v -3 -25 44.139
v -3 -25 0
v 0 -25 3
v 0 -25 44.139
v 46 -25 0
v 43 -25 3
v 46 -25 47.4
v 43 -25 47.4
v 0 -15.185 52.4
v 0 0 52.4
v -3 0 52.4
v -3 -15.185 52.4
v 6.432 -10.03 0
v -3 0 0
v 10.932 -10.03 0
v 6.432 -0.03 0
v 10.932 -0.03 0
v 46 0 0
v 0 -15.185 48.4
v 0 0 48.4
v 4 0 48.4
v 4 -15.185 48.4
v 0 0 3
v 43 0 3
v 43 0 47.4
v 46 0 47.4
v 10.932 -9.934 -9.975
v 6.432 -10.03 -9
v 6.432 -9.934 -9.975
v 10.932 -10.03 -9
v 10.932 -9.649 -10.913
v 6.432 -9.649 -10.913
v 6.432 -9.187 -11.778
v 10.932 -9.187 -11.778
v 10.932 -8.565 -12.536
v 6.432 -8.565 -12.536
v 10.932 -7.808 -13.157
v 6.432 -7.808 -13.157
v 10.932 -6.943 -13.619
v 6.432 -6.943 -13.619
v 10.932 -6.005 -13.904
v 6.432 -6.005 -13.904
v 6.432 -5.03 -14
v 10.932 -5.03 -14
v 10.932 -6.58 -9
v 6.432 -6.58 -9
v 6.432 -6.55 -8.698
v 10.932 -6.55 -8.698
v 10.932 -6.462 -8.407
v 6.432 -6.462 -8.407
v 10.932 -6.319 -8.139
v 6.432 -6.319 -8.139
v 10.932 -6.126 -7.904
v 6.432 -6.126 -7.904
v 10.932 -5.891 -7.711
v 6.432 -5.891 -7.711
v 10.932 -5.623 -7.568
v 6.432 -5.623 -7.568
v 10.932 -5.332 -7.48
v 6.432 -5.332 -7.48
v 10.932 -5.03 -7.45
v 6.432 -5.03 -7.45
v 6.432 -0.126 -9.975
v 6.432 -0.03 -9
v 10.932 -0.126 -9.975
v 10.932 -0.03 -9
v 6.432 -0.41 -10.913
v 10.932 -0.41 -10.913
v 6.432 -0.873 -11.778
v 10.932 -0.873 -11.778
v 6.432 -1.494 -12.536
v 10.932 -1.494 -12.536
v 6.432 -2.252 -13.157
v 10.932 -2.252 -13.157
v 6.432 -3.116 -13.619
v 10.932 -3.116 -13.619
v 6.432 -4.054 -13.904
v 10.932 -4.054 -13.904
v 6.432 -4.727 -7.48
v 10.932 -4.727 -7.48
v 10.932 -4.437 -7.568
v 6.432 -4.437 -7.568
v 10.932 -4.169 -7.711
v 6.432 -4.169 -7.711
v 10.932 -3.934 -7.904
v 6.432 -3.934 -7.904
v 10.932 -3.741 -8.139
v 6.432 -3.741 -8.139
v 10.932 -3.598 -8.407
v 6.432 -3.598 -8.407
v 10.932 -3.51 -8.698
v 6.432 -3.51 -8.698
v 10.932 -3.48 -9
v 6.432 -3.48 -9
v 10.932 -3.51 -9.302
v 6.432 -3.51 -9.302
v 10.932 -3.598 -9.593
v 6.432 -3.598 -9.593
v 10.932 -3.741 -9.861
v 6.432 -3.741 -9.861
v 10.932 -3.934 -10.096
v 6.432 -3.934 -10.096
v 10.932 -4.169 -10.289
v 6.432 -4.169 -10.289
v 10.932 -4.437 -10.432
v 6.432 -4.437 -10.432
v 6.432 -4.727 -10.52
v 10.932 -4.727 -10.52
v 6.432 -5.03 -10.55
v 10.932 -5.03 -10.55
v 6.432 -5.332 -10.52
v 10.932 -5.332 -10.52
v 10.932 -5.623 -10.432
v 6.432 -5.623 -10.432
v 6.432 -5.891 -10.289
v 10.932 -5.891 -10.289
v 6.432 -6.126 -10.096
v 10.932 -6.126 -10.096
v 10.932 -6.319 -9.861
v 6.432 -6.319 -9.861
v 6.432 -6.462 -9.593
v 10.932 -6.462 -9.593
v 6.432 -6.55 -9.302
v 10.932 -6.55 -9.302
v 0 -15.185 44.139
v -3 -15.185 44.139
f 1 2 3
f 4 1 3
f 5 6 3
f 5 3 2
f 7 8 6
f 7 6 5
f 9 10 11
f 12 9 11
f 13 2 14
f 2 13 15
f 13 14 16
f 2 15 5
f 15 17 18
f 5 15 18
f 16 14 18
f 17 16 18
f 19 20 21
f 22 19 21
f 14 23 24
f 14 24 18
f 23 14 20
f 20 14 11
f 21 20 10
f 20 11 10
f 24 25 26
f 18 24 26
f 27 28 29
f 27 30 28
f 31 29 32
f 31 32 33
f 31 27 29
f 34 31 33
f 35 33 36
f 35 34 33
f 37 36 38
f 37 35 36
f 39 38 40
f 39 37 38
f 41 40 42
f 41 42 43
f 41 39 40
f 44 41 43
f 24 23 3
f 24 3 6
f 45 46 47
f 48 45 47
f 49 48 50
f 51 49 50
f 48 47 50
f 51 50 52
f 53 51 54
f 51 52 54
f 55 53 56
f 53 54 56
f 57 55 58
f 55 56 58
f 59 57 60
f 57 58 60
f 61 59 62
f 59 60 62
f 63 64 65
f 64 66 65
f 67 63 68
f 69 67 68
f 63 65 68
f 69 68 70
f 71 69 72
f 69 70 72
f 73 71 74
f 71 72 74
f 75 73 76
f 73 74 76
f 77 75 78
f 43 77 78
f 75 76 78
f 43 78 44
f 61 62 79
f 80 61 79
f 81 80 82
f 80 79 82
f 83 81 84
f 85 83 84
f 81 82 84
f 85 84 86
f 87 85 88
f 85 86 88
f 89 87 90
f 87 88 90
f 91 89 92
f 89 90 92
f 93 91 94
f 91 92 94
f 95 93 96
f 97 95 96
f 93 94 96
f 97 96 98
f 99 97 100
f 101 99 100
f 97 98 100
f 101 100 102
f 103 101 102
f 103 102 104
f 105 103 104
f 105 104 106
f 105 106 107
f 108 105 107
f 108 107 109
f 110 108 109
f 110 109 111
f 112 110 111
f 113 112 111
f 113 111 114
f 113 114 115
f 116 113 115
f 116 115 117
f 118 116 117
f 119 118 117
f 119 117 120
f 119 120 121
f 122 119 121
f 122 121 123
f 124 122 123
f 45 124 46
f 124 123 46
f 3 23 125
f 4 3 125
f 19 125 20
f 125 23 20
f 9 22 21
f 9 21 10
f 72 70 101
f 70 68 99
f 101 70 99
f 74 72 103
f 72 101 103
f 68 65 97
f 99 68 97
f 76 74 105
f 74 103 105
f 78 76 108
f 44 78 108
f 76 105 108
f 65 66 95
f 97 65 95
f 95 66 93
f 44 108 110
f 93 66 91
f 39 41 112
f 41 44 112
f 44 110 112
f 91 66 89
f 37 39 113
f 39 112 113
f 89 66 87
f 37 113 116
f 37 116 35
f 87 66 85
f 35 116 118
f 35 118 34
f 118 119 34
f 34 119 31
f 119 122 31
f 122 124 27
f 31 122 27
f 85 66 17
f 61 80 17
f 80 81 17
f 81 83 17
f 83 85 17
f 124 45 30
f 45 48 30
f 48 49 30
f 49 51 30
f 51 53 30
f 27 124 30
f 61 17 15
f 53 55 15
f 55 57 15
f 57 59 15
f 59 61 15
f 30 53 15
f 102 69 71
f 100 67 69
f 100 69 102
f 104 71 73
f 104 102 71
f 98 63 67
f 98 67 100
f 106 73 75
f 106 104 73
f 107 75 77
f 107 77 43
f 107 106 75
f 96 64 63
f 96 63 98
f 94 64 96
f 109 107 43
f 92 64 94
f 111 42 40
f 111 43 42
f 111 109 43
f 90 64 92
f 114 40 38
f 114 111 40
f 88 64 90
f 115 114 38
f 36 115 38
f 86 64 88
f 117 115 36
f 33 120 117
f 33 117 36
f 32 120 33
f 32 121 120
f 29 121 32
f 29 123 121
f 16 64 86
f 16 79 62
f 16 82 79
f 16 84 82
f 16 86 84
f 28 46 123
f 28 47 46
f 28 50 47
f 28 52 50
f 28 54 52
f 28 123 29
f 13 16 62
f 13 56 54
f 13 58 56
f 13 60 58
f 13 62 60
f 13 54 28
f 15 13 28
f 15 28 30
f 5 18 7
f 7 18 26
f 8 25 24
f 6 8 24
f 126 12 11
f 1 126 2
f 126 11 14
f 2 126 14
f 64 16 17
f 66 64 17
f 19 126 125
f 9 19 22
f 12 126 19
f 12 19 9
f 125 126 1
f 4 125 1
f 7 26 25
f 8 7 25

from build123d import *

# Parameters (mm, degrees)
F0_W     = 43
F0_H     = 3
F1_DEPTH = 25
F2_W     = 4.5
F2_H     = 10
F3_DEPTH = 14
F4_R     = 4.99999
F6_DEPTH = 5
F7_W     = 9.8148105666
F7_H     = 8.2614529669
F8_DEPTH = 7


# Not quite as in the source:
# - a fillet or chamfer is up to 0.001 mm smaller than in the source, because OpenCascade refuses the exact size


with BuildPart() as f1:
    # F0 (on Front) → F1 (new body)
    with BuildSketch(Plane.XZ):
        Polygon((0, 52.4), (0, 48.4), (4, 48.4), align=None)
        Polygon((-3, 0), (0, 0), (0, 3), (0, 48.4), (0, 52.4), (-3, 52.4), align=None)
        with Locations((21.5, 1.5)):
            Rectangle(F0_W, F0_H)
        Polygon((43, 3), (43, 0), (46, 0), (46, 47.4), (43, 47.4), align=None)
    extrude(amount=F1_DEPTH)

    # F2 (on face) → F3 (join)
    with BuildSketch(Plane(origin=(0, 0, 0), x_dir=(1, 0, 0), z_dir=(0, 0, -1))):
        with Locations((8.6824605241, 5.0298511051)):
            Rectangle(F2_W, F2_H)
    extrude(amount=F3_DEPTH)

    # F4 (radius 5 in the source; OpenCascade refuses exactly that, so slightly less here)
    f4_edges = [f1.edges().sort_by_distance(p)[0] for p in [
        (8.682461, -10.029851, -14),
        (8.682461, -0.029851, -14),
    ]]
    fillet(f4_edges, radius=F4_R)

    # F5 (on face) → F6 (cut)
    with BuildSketch(Plane(origin=(6.4324605241, 0, 0), x_dir=(0, -1, 0), z_dir=(-1, 0, 0))):
        with BuildLine():
            ThreePointArc((5.0298511051, -7.45), (3.9338580131, -10.0959613868), (6.5798194, -8.9999682949))
            ThreePointArc((6.5798194, -8.9999682949), (6.125844197, -7.9039752029), (5.0298511051, -7.45))
        make_face()
    extrude(amount=-F6_DEPTH, mode=Mode.SUBTRACT)

    # F7 (on face) → F8 (cut)
    with BuildSketch(Plane(origin=(-3, 0, 0), x_dir=(0, -1, 0), z_dir=(-1, 0, 0))):
        with Locations((20.0925947167, 48.2692735165)):
            Rectangle(F7_W, F7_H)
    extrude(amount=-F8_DEPTH, mode=Mode.SUBTRACT)


solid = f1.part
